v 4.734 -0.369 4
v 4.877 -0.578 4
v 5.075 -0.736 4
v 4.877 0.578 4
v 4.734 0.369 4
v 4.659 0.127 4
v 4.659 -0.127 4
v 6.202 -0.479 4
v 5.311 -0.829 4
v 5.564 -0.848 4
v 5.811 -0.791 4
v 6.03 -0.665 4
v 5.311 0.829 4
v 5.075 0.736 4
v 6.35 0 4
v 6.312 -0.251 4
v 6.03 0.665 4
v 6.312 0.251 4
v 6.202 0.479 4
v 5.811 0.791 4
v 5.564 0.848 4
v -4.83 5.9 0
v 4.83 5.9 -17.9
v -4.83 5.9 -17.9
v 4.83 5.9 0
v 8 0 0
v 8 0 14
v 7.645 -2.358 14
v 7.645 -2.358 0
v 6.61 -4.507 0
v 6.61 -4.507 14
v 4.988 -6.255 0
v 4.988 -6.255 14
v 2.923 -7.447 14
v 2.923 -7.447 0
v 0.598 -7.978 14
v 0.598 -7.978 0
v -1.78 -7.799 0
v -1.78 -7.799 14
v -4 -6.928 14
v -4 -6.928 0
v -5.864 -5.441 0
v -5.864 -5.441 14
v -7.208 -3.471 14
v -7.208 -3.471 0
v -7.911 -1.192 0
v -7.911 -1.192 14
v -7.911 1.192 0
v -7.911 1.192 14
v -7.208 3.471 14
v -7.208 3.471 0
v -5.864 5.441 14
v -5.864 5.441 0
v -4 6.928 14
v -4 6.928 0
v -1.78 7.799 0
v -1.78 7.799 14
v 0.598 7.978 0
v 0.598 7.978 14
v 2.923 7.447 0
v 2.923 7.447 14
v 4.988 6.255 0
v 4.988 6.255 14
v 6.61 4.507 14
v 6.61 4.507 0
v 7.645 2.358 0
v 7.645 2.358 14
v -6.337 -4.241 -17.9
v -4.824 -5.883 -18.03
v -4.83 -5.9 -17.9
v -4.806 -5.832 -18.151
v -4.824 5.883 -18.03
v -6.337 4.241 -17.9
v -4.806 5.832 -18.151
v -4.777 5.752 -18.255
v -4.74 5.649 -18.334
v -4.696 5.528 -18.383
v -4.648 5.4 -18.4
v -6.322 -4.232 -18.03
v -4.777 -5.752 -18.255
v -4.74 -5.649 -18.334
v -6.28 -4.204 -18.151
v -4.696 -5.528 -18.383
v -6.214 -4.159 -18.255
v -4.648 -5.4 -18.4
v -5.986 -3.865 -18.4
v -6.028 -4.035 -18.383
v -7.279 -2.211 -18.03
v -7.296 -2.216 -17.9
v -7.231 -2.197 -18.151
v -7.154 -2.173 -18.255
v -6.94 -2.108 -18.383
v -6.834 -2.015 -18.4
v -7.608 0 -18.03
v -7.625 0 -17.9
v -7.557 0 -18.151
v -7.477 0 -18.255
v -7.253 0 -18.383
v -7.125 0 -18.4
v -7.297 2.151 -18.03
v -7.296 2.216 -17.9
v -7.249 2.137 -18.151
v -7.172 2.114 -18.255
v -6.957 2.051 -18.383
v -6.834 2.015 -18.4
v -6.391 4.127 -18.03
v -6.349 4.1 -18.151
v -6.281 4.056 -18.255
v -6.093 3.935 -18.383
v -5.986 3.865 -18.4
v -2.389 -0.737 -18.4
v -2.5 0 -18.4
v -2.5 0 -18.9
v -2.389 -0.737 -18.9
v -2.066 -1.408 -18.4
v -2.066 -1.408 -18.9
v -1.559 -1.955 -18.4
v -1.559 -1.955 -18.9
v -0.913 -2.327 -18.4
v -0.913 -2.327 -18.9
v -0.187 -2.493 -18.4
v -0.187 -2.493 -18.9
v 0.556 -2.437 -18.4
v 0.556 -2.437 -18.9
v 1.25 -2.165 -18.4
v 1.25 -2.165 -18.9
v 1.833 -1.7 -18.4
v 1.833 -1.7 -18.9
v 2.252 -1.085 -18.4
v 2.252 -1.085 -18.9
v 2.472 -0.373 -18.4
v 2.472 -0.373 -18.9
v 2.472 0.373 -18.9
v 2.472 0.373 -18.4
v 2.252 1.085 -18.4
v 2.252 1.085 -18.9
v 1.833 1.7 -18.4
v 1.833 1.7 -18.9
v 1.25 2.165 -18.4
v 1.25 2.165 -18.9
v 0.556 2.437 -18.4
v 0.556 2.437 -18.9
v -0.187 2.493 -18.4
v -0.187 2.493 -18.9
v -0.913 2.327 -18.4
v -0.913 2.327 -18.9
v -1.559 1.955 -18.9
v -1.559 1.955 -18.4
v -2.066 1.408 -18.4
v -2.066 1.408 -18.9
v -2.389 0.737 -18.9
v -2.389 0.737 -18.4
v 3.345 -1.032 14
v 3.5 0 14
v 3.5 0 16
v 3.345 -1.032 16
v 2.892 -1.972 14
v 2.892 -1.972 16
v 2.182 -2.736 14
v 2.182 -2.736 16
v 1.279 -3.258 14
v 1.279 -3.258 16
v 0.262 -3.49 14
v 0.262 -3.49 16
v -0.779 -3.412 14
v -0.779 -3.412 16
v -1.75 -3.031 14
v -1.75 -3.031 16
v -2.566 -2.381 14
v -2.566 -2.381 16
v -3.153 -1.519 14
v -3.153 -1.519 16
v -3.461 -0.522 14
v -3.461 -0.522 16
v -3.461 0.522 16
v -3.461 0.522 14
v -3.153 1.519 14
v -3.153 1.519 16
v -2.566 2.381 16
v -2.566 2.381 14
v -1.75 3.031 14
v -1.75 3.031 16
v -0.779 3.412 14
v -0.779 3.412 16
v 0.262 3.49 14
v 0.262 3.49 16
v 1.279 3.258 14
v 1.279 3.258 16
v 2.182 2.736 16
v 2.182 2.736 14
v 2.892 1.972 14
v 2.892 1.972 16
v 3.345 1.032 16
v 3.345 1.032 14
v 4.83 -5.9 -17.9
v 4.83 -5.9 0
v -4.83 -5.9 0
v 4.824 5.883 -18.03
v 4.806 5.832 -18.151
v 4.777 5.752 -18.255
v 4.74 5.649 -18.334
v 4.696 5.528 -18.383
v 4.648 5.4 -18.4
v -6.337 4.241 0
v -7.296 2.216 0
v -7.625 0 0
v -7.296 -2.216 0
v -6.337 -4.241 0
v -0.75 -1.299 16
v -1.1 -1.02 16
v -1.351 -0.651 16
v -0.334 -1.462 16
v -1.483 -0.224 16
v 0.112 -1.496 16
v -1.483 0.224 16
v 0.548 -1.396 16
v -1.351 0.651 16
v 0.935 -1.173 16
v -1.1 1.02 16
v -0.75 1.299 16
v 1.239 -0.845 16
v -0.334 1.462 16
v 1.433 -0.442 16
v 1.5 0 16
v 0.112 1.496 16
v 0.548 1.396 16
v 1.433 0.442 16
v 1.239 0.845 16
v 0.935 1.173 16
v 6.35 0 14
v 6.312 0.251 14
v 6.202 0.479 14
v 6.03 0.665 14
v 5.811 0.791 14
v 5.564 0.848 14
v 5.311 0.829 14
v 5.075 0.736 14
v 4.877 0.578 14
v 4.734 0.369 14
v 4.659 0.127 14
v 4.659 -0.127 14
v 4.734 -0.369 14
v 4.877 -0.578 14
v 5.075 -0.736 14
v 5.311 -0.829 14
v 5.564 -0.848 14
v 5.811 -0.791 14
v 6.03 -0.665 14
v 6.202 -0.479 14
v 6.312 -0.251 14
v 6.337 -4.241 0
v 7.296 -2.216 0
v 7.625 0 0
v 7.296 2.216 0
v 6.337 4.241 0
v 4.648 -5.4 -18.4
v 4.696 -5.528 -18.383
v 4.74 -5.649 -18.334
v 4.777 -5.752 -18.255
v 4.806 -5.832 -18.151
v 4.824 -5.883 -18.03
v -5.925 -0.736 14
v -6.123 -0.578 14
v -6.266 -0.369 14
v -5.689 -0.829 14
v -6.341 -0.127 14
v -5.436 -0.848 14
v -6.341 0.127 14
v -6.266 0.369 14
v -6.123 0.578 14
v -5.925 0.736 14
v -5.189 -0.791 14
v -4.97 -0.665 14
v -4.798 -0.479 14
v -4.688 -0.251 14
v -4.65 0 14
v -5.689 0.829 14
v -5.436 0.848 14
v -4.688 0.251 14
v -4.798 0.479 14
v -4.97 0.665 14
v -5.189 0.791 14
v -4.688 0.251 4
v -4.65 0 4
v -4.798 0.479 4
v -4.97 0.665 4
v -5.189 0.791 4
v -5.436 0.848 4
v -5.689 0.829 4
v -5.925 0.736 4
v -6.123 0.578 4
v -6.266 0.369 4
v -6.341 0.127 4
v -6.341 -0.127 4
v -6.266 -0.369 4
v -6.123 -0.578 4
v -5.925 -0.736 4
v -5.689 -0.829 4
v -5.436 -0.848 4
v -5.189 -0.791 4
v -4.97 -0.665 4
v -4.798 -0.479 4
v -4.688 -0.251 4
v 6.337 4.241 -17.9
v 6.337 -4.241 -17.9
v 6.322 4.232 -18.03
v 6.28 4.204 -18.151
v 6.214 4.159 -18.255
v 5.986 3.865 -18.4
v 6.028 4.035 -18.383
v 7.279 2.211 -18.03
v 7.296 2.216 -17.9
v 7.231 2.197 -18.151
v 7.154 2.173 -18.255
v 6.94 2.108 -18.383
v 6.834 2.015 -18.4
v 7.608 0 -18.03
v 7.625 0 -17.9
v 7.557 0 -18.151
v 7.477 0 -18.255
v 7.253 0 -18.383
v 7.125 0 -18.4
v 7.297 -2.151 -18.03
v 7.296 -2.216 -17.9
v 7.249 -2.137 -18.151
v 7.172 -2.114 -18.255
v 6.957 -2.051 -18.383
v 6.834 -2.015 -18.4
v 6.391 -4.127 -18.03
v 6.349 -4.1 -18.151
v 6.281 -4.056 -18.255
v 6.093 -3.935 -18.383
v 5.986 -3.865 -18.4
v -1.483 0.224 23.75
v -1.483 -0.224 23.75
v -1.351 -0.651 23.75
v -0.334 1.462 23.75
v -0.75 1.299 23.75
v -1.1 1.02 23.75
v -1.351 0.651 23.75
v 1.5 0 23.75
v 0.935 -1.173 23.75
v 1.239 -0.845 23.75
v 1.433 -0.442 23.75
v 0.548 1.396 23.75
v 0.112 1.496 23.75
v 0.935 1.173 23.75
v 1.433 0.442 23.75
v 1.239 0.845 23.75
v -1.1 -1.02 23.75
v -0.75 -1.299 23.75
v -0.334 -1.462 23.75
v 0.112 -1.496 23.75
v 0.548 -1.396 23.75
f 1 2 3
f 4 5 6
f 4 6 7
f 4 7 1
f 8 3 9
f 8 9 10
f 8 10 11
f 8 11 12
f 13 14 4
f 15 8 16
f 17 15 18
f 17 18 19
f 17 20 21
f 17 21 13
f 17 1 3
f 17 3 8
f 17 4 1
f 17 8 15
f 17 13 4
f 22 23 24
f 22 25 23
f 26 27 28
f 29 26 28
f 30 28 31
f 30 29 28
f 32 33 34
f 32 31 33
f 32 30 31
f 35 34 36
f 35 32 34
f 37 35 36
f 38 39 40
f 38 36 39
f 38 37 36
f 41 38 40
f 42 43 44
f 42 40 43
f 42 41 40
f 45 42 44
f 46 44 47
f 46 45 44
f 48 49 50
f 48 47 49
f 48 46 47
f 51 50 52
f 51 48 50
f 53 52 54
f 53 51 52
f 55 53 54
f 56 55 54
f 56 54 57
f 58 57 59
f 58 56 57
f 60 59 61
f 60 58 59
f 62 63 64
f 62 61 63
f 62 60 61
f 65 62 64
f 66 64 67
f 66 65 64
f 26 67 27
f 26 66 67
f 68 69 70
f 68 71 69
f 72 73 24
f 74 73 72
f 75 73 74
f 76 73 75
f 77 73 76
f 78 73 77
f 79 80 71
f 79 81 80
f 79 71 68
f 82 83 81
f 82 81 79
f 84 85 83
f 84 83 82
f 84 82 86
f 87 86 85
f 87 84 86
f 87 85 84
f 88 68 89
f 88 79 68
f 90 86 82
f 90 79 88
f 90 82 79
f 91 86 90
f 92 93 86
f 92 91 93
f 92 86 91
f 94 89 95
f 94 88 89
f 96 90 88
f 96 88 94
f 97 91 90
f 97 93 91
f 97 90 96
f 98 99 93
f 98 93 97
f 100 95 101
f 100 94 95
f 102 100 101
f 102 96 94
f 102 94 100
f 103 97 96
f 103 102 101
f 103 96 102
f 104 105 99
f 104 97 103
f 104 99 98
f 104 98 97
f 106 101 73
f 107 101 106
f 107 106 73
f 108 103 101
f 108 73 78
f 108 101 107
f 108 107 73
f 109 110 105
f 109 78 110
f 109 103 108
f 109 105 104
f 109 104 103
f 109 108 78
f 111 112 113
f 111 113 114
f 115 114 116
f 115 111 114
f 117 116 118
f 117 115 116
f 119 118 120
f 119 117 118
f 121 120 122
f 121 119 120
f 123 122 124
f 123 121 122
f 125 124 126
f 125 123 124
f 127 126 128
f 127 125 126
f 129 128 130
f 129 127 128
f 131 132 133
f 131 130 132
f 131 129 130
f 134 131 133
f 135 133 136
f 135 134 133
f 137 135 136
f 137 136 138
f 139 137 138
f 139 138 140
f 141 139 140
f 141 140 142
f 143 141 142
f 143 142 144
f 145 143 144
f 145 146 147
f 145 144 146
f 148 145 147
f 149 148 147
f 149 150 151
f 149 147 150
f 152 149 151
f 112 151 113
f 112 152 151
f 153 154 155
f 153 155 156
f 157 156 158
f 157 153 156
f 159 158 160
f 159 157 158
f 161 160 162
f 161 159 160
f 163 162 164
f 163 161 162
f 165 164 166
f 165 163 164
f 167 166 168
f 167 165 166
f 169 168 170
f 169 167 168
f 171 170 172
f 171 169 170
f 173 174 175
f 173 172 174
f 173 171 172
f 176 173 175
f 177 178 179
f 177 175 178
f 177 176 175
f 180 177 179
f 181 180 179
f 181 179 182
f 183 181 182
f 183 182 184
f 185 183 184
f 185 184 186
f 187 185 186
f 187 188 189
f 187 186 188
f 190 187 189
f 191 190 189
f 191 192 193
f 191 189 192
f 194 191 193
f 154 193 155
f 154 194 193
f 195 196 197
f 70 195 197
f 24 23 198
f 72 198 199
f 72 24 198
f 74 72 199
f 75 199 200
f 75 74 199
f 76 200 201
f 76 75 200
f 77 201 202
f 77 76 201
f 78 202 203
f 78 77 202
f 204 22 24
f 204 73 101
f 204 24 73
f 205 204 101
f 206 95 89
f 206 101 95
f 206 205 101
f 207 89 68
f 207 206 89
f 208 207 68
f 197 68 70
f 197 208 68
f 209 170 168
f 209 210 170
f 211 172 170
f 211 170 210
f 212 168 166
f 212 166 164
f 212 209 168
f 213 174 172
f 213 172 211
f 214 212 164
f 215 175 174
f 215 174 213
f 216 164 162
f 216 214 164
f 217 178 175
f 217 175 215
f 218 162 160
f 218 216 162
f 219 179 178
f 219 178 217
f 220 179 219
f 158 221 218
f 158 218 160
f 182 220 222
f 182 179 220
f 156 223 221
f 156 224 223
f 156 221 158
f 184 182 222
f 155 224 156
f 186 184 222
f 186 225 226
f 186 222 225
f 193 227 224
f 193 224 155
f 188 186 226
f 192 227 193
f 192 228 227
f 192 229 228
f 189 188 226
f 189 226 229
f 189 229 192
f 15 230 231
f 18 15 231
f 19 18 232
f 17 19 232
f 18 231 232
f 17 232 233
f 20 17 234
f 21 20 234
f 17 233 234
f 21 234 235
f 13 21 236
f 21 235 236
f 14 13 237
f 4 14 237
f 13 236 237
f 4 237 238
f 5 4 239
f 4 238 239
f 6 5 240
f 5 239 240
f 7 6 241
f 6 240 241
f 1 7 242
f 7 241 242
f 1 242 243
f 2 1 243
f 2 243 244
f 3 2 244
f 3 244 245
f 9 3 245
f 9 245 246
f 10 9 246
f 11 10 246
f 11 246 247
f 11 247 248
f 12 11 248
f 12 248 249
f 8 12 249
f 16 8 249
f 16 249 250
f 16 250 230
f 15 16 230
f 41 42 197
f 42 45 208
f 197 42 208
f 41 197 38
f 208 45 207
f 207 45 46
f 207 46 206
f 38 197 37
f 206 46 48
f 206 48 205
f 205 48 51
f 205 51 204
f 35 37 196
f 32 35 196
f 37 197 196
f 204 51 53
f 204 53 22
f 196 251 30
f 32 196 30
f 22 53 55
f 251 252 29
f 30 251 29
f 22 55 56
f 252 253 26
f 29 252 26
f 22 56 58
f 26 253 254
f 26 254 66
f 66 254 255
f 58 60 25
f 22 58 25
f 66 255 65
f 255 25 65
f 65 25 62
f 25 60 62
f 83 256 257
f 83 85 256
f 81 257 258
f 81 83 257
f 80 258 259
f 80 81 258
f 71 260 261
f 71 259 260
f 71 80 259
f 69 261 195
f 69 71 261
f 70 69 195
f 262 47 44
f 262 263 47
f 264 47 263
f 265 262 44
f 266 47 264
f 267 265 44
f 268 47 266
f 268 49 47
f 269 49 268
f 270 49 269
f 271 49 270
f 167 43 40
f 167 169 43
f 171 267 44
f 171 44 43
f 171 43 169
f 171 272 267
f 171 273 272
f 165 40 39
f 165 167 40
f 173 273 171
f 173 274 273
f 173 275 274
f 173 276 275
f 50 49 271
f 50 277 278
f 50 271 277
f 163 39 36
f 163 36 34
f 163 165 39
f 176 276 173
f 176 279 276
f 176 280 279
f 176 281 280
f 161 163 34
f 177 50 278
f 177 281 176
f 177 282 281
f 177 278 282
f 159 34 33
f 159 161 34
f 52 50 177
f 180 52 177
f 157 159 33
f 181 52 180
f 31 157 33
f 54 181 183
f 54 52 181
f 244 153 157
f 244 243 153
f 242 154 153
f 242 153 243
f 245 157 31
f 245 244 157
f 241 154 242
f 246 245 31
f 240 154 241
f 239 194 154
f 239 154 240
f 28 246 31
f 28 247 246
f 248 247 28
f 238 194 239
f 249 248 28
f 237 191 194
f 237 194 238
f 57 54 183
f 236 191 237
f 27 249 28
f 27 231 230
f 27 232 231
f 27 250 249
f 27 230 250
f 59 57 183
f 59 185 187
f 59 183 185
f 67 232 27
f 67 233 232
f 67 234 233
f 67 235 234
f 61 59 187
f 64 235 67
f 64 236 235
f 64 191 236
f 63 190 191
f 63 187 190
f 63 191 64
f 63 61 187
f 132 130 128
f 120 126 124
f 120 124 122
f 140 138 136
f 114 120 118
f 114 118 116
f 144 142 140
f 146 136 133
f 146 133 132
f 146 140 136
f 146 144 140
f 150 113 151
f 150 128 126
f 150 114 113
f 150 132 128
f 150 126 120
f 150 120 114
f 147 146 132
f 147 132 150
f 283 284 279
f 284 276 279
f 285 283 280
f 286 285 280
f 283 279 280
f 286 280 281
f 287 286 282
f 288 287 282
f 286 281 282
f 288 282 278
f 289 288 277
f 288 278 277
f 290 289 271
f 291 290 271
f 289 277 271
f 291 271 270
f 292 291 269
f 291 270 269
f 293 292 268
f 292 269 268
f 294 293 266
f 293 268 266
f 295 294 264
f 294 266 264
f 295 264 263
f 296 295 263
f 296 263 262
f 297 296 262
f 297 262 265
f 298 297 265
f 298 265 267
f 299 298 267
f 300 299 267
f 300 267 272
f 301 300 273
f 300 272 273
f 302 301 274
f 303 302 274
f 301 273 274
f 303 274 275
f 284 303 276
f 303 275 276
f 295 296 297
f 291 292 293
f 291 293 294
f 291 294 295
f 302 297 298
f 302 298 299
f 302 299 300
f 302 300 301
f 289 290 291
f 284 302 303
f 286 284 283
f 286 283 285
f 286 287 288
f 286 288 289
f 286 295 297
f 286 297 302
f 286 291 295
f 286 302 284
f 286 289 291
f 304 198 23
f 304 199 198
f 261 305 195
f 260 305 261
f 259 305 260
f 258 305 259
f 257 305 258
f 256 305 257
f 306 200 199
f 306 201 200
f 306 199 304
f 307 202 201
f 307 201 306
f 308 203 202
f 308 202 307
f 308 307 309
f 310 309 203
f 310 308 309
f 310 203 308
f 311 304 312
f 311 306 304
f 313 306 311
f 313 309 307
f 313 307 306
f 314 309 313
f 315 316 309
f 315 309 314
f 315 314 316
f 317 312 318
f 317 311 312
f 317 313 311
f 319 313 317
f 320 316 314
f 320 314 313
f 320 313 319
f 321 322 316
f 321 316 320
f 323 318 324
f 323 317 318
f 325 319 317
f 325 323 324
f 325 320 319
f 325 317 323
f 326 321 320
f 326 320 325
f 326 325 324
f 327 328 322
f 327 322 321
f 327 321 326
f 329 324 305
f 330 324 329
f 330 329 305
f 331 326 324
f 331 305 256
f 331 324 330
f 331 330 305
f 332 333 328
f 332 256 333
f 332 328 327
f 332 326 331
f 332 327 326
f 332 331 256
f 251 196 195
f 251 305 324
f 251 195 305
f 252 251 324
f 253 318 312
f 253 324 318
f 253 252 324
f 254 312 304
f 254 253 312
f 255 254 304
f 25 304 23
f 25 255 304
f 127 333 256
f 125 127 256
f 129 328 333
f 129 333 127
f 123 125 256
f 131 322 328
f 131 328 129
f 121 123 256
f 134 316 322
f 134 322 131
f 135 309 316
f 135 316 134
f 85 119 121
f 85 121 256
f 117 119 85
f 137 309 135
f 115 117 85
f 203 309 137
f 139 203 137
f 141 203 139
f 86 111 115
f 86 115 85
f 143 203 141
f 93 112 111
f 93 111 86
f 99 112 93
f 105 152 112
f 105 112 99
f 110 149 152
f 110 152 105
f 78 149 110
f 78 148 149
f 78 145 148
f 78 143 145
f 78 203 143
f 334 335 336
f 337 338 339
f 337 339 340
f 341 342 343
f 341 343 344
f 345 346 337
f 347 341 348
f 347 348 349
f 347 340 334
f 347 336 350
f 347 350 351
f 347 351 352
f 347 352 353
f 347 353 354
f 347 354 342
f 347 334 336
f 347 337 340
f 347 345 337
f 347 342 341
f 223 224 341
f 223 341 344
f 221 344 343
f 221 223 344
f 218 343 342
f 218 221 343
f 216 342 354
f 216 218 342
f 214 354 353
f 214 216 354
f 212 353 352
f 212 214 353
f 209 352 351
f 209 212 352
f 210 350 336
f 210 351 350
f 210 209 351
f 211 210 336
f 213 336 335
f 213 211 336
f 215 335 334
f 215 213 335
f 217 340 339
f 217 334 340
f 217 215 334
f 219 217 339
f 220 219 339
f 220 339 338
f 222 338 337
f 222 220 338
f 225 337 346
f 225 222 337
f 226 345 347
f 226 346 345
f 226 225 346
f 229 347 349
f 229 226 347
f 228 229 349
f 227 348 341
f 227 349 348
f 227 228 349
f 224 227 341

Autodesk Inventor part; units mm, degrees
ref_plane "YZ Plane" through (0, 0, 0) normal (1, 0, 0) x (0, 1, 0)
ref_plane "XZ Plane" through (0, 0, 0) normal (0, 1, 0) x (-1, 0, 0)
ref_plane "XY Plane" through (0, 0, 0) normal (0, 0, 1) x (1, 0, 0)
sketch "Sketch1" plane through (0, 0, 0) normal (0, 0, 1) x (1, 0, 0)
  circle A0 centre (0, 0) radius 8
  dimension "d0" = 16
extrude "Extrusion1" add sketch "Sketch1" along normal blind 14
sketch "Sketch2" plane through (0, 0, 14) normal (0, 0, 1) x (1, 0, 0)
  circle A0 centre (0, 0) radius 8 projected
  circle A1 centre (5.5, 0) radius 0.85
  circle A2 centre (-5.5, 0) radius 0.85
  dimension "d3" = 1.7
  dimension "d4" = 1.7
  dimension "d5" = 5.5
  dimension "d6" = 5.5
extrude "Extrusion2" cut sketch "Sketch2" against normal blind 10 contours A1 | A2
sketch "Sketch3" plane through (0, 0, 14) normal (0, 0, 1) x (1, 0, 0)
  circle A0 centre (0, 0) radius 8 projected
  circle A1 centre (0, 0) radius 3.5
  dimension "d9" = 7
extrude "Extrusion3" add sketch "Sketch3" along normal blind 2 contours A1
sketch "Sketch4" plane through (0, 0, 16) normal (0, 0, 1) x (1, 0, 0)
  circle A0 centre (0, 0) radius 3.5 projected
  circle A1 centre (0, 0) radius 1.5
  dimension "d12" = 3
extrude "Extrusion4" add sketch "Sketch4" along normal blind 7.75 contours A1
sketch "Sketch5" plane through (0, 0, 0) normal (0, 0, -1) x (-1, 0, 0)
  circle A0 centre (0, 0) radius 8 projected
  line L0 (-4.8302, 5.9) -> (4.8302, 5.9)
  line L1 (-4.8302, -5.9) -> (4.8302, -5.9)
  arc A1 (-4.8302, 5.9) -> (-4.8302, -5.9) centre (0, 0) ccw
  arc A2 (4.8302, -5.9) -> (4.8302, 5.9) centre (0, 0) ccw
  dimension "d16" = 5.9
  dimension "d17" = 5.9
extrude "Extrusion5" add sketch "Sketch5" along normal blind 18.4 contours L0 A2 L1 A1
fillet "Fillet1" radius 0.5 4 edges at (0, 5.9, -18.4) (7.625, 0, -18.4) (-7.625, 0, -18.4) (0, -5.9, -18.4)
sketch "Sketch6" plane through (0, 0, -18.4) normal (0, 0, -1) x (-1, 0, 0)
  arc A0 (-4.6482, 5.4) -> (-4.6482, -5.4) centre (0, 0) ccw projected
  circle A1 centre (0, 0) radius 2.5
  dimension "d21" = 5
extrude "Extrusion6" add sketch "Sketch6" along normal blind 0.5
properties part number "Gantry Motor"
